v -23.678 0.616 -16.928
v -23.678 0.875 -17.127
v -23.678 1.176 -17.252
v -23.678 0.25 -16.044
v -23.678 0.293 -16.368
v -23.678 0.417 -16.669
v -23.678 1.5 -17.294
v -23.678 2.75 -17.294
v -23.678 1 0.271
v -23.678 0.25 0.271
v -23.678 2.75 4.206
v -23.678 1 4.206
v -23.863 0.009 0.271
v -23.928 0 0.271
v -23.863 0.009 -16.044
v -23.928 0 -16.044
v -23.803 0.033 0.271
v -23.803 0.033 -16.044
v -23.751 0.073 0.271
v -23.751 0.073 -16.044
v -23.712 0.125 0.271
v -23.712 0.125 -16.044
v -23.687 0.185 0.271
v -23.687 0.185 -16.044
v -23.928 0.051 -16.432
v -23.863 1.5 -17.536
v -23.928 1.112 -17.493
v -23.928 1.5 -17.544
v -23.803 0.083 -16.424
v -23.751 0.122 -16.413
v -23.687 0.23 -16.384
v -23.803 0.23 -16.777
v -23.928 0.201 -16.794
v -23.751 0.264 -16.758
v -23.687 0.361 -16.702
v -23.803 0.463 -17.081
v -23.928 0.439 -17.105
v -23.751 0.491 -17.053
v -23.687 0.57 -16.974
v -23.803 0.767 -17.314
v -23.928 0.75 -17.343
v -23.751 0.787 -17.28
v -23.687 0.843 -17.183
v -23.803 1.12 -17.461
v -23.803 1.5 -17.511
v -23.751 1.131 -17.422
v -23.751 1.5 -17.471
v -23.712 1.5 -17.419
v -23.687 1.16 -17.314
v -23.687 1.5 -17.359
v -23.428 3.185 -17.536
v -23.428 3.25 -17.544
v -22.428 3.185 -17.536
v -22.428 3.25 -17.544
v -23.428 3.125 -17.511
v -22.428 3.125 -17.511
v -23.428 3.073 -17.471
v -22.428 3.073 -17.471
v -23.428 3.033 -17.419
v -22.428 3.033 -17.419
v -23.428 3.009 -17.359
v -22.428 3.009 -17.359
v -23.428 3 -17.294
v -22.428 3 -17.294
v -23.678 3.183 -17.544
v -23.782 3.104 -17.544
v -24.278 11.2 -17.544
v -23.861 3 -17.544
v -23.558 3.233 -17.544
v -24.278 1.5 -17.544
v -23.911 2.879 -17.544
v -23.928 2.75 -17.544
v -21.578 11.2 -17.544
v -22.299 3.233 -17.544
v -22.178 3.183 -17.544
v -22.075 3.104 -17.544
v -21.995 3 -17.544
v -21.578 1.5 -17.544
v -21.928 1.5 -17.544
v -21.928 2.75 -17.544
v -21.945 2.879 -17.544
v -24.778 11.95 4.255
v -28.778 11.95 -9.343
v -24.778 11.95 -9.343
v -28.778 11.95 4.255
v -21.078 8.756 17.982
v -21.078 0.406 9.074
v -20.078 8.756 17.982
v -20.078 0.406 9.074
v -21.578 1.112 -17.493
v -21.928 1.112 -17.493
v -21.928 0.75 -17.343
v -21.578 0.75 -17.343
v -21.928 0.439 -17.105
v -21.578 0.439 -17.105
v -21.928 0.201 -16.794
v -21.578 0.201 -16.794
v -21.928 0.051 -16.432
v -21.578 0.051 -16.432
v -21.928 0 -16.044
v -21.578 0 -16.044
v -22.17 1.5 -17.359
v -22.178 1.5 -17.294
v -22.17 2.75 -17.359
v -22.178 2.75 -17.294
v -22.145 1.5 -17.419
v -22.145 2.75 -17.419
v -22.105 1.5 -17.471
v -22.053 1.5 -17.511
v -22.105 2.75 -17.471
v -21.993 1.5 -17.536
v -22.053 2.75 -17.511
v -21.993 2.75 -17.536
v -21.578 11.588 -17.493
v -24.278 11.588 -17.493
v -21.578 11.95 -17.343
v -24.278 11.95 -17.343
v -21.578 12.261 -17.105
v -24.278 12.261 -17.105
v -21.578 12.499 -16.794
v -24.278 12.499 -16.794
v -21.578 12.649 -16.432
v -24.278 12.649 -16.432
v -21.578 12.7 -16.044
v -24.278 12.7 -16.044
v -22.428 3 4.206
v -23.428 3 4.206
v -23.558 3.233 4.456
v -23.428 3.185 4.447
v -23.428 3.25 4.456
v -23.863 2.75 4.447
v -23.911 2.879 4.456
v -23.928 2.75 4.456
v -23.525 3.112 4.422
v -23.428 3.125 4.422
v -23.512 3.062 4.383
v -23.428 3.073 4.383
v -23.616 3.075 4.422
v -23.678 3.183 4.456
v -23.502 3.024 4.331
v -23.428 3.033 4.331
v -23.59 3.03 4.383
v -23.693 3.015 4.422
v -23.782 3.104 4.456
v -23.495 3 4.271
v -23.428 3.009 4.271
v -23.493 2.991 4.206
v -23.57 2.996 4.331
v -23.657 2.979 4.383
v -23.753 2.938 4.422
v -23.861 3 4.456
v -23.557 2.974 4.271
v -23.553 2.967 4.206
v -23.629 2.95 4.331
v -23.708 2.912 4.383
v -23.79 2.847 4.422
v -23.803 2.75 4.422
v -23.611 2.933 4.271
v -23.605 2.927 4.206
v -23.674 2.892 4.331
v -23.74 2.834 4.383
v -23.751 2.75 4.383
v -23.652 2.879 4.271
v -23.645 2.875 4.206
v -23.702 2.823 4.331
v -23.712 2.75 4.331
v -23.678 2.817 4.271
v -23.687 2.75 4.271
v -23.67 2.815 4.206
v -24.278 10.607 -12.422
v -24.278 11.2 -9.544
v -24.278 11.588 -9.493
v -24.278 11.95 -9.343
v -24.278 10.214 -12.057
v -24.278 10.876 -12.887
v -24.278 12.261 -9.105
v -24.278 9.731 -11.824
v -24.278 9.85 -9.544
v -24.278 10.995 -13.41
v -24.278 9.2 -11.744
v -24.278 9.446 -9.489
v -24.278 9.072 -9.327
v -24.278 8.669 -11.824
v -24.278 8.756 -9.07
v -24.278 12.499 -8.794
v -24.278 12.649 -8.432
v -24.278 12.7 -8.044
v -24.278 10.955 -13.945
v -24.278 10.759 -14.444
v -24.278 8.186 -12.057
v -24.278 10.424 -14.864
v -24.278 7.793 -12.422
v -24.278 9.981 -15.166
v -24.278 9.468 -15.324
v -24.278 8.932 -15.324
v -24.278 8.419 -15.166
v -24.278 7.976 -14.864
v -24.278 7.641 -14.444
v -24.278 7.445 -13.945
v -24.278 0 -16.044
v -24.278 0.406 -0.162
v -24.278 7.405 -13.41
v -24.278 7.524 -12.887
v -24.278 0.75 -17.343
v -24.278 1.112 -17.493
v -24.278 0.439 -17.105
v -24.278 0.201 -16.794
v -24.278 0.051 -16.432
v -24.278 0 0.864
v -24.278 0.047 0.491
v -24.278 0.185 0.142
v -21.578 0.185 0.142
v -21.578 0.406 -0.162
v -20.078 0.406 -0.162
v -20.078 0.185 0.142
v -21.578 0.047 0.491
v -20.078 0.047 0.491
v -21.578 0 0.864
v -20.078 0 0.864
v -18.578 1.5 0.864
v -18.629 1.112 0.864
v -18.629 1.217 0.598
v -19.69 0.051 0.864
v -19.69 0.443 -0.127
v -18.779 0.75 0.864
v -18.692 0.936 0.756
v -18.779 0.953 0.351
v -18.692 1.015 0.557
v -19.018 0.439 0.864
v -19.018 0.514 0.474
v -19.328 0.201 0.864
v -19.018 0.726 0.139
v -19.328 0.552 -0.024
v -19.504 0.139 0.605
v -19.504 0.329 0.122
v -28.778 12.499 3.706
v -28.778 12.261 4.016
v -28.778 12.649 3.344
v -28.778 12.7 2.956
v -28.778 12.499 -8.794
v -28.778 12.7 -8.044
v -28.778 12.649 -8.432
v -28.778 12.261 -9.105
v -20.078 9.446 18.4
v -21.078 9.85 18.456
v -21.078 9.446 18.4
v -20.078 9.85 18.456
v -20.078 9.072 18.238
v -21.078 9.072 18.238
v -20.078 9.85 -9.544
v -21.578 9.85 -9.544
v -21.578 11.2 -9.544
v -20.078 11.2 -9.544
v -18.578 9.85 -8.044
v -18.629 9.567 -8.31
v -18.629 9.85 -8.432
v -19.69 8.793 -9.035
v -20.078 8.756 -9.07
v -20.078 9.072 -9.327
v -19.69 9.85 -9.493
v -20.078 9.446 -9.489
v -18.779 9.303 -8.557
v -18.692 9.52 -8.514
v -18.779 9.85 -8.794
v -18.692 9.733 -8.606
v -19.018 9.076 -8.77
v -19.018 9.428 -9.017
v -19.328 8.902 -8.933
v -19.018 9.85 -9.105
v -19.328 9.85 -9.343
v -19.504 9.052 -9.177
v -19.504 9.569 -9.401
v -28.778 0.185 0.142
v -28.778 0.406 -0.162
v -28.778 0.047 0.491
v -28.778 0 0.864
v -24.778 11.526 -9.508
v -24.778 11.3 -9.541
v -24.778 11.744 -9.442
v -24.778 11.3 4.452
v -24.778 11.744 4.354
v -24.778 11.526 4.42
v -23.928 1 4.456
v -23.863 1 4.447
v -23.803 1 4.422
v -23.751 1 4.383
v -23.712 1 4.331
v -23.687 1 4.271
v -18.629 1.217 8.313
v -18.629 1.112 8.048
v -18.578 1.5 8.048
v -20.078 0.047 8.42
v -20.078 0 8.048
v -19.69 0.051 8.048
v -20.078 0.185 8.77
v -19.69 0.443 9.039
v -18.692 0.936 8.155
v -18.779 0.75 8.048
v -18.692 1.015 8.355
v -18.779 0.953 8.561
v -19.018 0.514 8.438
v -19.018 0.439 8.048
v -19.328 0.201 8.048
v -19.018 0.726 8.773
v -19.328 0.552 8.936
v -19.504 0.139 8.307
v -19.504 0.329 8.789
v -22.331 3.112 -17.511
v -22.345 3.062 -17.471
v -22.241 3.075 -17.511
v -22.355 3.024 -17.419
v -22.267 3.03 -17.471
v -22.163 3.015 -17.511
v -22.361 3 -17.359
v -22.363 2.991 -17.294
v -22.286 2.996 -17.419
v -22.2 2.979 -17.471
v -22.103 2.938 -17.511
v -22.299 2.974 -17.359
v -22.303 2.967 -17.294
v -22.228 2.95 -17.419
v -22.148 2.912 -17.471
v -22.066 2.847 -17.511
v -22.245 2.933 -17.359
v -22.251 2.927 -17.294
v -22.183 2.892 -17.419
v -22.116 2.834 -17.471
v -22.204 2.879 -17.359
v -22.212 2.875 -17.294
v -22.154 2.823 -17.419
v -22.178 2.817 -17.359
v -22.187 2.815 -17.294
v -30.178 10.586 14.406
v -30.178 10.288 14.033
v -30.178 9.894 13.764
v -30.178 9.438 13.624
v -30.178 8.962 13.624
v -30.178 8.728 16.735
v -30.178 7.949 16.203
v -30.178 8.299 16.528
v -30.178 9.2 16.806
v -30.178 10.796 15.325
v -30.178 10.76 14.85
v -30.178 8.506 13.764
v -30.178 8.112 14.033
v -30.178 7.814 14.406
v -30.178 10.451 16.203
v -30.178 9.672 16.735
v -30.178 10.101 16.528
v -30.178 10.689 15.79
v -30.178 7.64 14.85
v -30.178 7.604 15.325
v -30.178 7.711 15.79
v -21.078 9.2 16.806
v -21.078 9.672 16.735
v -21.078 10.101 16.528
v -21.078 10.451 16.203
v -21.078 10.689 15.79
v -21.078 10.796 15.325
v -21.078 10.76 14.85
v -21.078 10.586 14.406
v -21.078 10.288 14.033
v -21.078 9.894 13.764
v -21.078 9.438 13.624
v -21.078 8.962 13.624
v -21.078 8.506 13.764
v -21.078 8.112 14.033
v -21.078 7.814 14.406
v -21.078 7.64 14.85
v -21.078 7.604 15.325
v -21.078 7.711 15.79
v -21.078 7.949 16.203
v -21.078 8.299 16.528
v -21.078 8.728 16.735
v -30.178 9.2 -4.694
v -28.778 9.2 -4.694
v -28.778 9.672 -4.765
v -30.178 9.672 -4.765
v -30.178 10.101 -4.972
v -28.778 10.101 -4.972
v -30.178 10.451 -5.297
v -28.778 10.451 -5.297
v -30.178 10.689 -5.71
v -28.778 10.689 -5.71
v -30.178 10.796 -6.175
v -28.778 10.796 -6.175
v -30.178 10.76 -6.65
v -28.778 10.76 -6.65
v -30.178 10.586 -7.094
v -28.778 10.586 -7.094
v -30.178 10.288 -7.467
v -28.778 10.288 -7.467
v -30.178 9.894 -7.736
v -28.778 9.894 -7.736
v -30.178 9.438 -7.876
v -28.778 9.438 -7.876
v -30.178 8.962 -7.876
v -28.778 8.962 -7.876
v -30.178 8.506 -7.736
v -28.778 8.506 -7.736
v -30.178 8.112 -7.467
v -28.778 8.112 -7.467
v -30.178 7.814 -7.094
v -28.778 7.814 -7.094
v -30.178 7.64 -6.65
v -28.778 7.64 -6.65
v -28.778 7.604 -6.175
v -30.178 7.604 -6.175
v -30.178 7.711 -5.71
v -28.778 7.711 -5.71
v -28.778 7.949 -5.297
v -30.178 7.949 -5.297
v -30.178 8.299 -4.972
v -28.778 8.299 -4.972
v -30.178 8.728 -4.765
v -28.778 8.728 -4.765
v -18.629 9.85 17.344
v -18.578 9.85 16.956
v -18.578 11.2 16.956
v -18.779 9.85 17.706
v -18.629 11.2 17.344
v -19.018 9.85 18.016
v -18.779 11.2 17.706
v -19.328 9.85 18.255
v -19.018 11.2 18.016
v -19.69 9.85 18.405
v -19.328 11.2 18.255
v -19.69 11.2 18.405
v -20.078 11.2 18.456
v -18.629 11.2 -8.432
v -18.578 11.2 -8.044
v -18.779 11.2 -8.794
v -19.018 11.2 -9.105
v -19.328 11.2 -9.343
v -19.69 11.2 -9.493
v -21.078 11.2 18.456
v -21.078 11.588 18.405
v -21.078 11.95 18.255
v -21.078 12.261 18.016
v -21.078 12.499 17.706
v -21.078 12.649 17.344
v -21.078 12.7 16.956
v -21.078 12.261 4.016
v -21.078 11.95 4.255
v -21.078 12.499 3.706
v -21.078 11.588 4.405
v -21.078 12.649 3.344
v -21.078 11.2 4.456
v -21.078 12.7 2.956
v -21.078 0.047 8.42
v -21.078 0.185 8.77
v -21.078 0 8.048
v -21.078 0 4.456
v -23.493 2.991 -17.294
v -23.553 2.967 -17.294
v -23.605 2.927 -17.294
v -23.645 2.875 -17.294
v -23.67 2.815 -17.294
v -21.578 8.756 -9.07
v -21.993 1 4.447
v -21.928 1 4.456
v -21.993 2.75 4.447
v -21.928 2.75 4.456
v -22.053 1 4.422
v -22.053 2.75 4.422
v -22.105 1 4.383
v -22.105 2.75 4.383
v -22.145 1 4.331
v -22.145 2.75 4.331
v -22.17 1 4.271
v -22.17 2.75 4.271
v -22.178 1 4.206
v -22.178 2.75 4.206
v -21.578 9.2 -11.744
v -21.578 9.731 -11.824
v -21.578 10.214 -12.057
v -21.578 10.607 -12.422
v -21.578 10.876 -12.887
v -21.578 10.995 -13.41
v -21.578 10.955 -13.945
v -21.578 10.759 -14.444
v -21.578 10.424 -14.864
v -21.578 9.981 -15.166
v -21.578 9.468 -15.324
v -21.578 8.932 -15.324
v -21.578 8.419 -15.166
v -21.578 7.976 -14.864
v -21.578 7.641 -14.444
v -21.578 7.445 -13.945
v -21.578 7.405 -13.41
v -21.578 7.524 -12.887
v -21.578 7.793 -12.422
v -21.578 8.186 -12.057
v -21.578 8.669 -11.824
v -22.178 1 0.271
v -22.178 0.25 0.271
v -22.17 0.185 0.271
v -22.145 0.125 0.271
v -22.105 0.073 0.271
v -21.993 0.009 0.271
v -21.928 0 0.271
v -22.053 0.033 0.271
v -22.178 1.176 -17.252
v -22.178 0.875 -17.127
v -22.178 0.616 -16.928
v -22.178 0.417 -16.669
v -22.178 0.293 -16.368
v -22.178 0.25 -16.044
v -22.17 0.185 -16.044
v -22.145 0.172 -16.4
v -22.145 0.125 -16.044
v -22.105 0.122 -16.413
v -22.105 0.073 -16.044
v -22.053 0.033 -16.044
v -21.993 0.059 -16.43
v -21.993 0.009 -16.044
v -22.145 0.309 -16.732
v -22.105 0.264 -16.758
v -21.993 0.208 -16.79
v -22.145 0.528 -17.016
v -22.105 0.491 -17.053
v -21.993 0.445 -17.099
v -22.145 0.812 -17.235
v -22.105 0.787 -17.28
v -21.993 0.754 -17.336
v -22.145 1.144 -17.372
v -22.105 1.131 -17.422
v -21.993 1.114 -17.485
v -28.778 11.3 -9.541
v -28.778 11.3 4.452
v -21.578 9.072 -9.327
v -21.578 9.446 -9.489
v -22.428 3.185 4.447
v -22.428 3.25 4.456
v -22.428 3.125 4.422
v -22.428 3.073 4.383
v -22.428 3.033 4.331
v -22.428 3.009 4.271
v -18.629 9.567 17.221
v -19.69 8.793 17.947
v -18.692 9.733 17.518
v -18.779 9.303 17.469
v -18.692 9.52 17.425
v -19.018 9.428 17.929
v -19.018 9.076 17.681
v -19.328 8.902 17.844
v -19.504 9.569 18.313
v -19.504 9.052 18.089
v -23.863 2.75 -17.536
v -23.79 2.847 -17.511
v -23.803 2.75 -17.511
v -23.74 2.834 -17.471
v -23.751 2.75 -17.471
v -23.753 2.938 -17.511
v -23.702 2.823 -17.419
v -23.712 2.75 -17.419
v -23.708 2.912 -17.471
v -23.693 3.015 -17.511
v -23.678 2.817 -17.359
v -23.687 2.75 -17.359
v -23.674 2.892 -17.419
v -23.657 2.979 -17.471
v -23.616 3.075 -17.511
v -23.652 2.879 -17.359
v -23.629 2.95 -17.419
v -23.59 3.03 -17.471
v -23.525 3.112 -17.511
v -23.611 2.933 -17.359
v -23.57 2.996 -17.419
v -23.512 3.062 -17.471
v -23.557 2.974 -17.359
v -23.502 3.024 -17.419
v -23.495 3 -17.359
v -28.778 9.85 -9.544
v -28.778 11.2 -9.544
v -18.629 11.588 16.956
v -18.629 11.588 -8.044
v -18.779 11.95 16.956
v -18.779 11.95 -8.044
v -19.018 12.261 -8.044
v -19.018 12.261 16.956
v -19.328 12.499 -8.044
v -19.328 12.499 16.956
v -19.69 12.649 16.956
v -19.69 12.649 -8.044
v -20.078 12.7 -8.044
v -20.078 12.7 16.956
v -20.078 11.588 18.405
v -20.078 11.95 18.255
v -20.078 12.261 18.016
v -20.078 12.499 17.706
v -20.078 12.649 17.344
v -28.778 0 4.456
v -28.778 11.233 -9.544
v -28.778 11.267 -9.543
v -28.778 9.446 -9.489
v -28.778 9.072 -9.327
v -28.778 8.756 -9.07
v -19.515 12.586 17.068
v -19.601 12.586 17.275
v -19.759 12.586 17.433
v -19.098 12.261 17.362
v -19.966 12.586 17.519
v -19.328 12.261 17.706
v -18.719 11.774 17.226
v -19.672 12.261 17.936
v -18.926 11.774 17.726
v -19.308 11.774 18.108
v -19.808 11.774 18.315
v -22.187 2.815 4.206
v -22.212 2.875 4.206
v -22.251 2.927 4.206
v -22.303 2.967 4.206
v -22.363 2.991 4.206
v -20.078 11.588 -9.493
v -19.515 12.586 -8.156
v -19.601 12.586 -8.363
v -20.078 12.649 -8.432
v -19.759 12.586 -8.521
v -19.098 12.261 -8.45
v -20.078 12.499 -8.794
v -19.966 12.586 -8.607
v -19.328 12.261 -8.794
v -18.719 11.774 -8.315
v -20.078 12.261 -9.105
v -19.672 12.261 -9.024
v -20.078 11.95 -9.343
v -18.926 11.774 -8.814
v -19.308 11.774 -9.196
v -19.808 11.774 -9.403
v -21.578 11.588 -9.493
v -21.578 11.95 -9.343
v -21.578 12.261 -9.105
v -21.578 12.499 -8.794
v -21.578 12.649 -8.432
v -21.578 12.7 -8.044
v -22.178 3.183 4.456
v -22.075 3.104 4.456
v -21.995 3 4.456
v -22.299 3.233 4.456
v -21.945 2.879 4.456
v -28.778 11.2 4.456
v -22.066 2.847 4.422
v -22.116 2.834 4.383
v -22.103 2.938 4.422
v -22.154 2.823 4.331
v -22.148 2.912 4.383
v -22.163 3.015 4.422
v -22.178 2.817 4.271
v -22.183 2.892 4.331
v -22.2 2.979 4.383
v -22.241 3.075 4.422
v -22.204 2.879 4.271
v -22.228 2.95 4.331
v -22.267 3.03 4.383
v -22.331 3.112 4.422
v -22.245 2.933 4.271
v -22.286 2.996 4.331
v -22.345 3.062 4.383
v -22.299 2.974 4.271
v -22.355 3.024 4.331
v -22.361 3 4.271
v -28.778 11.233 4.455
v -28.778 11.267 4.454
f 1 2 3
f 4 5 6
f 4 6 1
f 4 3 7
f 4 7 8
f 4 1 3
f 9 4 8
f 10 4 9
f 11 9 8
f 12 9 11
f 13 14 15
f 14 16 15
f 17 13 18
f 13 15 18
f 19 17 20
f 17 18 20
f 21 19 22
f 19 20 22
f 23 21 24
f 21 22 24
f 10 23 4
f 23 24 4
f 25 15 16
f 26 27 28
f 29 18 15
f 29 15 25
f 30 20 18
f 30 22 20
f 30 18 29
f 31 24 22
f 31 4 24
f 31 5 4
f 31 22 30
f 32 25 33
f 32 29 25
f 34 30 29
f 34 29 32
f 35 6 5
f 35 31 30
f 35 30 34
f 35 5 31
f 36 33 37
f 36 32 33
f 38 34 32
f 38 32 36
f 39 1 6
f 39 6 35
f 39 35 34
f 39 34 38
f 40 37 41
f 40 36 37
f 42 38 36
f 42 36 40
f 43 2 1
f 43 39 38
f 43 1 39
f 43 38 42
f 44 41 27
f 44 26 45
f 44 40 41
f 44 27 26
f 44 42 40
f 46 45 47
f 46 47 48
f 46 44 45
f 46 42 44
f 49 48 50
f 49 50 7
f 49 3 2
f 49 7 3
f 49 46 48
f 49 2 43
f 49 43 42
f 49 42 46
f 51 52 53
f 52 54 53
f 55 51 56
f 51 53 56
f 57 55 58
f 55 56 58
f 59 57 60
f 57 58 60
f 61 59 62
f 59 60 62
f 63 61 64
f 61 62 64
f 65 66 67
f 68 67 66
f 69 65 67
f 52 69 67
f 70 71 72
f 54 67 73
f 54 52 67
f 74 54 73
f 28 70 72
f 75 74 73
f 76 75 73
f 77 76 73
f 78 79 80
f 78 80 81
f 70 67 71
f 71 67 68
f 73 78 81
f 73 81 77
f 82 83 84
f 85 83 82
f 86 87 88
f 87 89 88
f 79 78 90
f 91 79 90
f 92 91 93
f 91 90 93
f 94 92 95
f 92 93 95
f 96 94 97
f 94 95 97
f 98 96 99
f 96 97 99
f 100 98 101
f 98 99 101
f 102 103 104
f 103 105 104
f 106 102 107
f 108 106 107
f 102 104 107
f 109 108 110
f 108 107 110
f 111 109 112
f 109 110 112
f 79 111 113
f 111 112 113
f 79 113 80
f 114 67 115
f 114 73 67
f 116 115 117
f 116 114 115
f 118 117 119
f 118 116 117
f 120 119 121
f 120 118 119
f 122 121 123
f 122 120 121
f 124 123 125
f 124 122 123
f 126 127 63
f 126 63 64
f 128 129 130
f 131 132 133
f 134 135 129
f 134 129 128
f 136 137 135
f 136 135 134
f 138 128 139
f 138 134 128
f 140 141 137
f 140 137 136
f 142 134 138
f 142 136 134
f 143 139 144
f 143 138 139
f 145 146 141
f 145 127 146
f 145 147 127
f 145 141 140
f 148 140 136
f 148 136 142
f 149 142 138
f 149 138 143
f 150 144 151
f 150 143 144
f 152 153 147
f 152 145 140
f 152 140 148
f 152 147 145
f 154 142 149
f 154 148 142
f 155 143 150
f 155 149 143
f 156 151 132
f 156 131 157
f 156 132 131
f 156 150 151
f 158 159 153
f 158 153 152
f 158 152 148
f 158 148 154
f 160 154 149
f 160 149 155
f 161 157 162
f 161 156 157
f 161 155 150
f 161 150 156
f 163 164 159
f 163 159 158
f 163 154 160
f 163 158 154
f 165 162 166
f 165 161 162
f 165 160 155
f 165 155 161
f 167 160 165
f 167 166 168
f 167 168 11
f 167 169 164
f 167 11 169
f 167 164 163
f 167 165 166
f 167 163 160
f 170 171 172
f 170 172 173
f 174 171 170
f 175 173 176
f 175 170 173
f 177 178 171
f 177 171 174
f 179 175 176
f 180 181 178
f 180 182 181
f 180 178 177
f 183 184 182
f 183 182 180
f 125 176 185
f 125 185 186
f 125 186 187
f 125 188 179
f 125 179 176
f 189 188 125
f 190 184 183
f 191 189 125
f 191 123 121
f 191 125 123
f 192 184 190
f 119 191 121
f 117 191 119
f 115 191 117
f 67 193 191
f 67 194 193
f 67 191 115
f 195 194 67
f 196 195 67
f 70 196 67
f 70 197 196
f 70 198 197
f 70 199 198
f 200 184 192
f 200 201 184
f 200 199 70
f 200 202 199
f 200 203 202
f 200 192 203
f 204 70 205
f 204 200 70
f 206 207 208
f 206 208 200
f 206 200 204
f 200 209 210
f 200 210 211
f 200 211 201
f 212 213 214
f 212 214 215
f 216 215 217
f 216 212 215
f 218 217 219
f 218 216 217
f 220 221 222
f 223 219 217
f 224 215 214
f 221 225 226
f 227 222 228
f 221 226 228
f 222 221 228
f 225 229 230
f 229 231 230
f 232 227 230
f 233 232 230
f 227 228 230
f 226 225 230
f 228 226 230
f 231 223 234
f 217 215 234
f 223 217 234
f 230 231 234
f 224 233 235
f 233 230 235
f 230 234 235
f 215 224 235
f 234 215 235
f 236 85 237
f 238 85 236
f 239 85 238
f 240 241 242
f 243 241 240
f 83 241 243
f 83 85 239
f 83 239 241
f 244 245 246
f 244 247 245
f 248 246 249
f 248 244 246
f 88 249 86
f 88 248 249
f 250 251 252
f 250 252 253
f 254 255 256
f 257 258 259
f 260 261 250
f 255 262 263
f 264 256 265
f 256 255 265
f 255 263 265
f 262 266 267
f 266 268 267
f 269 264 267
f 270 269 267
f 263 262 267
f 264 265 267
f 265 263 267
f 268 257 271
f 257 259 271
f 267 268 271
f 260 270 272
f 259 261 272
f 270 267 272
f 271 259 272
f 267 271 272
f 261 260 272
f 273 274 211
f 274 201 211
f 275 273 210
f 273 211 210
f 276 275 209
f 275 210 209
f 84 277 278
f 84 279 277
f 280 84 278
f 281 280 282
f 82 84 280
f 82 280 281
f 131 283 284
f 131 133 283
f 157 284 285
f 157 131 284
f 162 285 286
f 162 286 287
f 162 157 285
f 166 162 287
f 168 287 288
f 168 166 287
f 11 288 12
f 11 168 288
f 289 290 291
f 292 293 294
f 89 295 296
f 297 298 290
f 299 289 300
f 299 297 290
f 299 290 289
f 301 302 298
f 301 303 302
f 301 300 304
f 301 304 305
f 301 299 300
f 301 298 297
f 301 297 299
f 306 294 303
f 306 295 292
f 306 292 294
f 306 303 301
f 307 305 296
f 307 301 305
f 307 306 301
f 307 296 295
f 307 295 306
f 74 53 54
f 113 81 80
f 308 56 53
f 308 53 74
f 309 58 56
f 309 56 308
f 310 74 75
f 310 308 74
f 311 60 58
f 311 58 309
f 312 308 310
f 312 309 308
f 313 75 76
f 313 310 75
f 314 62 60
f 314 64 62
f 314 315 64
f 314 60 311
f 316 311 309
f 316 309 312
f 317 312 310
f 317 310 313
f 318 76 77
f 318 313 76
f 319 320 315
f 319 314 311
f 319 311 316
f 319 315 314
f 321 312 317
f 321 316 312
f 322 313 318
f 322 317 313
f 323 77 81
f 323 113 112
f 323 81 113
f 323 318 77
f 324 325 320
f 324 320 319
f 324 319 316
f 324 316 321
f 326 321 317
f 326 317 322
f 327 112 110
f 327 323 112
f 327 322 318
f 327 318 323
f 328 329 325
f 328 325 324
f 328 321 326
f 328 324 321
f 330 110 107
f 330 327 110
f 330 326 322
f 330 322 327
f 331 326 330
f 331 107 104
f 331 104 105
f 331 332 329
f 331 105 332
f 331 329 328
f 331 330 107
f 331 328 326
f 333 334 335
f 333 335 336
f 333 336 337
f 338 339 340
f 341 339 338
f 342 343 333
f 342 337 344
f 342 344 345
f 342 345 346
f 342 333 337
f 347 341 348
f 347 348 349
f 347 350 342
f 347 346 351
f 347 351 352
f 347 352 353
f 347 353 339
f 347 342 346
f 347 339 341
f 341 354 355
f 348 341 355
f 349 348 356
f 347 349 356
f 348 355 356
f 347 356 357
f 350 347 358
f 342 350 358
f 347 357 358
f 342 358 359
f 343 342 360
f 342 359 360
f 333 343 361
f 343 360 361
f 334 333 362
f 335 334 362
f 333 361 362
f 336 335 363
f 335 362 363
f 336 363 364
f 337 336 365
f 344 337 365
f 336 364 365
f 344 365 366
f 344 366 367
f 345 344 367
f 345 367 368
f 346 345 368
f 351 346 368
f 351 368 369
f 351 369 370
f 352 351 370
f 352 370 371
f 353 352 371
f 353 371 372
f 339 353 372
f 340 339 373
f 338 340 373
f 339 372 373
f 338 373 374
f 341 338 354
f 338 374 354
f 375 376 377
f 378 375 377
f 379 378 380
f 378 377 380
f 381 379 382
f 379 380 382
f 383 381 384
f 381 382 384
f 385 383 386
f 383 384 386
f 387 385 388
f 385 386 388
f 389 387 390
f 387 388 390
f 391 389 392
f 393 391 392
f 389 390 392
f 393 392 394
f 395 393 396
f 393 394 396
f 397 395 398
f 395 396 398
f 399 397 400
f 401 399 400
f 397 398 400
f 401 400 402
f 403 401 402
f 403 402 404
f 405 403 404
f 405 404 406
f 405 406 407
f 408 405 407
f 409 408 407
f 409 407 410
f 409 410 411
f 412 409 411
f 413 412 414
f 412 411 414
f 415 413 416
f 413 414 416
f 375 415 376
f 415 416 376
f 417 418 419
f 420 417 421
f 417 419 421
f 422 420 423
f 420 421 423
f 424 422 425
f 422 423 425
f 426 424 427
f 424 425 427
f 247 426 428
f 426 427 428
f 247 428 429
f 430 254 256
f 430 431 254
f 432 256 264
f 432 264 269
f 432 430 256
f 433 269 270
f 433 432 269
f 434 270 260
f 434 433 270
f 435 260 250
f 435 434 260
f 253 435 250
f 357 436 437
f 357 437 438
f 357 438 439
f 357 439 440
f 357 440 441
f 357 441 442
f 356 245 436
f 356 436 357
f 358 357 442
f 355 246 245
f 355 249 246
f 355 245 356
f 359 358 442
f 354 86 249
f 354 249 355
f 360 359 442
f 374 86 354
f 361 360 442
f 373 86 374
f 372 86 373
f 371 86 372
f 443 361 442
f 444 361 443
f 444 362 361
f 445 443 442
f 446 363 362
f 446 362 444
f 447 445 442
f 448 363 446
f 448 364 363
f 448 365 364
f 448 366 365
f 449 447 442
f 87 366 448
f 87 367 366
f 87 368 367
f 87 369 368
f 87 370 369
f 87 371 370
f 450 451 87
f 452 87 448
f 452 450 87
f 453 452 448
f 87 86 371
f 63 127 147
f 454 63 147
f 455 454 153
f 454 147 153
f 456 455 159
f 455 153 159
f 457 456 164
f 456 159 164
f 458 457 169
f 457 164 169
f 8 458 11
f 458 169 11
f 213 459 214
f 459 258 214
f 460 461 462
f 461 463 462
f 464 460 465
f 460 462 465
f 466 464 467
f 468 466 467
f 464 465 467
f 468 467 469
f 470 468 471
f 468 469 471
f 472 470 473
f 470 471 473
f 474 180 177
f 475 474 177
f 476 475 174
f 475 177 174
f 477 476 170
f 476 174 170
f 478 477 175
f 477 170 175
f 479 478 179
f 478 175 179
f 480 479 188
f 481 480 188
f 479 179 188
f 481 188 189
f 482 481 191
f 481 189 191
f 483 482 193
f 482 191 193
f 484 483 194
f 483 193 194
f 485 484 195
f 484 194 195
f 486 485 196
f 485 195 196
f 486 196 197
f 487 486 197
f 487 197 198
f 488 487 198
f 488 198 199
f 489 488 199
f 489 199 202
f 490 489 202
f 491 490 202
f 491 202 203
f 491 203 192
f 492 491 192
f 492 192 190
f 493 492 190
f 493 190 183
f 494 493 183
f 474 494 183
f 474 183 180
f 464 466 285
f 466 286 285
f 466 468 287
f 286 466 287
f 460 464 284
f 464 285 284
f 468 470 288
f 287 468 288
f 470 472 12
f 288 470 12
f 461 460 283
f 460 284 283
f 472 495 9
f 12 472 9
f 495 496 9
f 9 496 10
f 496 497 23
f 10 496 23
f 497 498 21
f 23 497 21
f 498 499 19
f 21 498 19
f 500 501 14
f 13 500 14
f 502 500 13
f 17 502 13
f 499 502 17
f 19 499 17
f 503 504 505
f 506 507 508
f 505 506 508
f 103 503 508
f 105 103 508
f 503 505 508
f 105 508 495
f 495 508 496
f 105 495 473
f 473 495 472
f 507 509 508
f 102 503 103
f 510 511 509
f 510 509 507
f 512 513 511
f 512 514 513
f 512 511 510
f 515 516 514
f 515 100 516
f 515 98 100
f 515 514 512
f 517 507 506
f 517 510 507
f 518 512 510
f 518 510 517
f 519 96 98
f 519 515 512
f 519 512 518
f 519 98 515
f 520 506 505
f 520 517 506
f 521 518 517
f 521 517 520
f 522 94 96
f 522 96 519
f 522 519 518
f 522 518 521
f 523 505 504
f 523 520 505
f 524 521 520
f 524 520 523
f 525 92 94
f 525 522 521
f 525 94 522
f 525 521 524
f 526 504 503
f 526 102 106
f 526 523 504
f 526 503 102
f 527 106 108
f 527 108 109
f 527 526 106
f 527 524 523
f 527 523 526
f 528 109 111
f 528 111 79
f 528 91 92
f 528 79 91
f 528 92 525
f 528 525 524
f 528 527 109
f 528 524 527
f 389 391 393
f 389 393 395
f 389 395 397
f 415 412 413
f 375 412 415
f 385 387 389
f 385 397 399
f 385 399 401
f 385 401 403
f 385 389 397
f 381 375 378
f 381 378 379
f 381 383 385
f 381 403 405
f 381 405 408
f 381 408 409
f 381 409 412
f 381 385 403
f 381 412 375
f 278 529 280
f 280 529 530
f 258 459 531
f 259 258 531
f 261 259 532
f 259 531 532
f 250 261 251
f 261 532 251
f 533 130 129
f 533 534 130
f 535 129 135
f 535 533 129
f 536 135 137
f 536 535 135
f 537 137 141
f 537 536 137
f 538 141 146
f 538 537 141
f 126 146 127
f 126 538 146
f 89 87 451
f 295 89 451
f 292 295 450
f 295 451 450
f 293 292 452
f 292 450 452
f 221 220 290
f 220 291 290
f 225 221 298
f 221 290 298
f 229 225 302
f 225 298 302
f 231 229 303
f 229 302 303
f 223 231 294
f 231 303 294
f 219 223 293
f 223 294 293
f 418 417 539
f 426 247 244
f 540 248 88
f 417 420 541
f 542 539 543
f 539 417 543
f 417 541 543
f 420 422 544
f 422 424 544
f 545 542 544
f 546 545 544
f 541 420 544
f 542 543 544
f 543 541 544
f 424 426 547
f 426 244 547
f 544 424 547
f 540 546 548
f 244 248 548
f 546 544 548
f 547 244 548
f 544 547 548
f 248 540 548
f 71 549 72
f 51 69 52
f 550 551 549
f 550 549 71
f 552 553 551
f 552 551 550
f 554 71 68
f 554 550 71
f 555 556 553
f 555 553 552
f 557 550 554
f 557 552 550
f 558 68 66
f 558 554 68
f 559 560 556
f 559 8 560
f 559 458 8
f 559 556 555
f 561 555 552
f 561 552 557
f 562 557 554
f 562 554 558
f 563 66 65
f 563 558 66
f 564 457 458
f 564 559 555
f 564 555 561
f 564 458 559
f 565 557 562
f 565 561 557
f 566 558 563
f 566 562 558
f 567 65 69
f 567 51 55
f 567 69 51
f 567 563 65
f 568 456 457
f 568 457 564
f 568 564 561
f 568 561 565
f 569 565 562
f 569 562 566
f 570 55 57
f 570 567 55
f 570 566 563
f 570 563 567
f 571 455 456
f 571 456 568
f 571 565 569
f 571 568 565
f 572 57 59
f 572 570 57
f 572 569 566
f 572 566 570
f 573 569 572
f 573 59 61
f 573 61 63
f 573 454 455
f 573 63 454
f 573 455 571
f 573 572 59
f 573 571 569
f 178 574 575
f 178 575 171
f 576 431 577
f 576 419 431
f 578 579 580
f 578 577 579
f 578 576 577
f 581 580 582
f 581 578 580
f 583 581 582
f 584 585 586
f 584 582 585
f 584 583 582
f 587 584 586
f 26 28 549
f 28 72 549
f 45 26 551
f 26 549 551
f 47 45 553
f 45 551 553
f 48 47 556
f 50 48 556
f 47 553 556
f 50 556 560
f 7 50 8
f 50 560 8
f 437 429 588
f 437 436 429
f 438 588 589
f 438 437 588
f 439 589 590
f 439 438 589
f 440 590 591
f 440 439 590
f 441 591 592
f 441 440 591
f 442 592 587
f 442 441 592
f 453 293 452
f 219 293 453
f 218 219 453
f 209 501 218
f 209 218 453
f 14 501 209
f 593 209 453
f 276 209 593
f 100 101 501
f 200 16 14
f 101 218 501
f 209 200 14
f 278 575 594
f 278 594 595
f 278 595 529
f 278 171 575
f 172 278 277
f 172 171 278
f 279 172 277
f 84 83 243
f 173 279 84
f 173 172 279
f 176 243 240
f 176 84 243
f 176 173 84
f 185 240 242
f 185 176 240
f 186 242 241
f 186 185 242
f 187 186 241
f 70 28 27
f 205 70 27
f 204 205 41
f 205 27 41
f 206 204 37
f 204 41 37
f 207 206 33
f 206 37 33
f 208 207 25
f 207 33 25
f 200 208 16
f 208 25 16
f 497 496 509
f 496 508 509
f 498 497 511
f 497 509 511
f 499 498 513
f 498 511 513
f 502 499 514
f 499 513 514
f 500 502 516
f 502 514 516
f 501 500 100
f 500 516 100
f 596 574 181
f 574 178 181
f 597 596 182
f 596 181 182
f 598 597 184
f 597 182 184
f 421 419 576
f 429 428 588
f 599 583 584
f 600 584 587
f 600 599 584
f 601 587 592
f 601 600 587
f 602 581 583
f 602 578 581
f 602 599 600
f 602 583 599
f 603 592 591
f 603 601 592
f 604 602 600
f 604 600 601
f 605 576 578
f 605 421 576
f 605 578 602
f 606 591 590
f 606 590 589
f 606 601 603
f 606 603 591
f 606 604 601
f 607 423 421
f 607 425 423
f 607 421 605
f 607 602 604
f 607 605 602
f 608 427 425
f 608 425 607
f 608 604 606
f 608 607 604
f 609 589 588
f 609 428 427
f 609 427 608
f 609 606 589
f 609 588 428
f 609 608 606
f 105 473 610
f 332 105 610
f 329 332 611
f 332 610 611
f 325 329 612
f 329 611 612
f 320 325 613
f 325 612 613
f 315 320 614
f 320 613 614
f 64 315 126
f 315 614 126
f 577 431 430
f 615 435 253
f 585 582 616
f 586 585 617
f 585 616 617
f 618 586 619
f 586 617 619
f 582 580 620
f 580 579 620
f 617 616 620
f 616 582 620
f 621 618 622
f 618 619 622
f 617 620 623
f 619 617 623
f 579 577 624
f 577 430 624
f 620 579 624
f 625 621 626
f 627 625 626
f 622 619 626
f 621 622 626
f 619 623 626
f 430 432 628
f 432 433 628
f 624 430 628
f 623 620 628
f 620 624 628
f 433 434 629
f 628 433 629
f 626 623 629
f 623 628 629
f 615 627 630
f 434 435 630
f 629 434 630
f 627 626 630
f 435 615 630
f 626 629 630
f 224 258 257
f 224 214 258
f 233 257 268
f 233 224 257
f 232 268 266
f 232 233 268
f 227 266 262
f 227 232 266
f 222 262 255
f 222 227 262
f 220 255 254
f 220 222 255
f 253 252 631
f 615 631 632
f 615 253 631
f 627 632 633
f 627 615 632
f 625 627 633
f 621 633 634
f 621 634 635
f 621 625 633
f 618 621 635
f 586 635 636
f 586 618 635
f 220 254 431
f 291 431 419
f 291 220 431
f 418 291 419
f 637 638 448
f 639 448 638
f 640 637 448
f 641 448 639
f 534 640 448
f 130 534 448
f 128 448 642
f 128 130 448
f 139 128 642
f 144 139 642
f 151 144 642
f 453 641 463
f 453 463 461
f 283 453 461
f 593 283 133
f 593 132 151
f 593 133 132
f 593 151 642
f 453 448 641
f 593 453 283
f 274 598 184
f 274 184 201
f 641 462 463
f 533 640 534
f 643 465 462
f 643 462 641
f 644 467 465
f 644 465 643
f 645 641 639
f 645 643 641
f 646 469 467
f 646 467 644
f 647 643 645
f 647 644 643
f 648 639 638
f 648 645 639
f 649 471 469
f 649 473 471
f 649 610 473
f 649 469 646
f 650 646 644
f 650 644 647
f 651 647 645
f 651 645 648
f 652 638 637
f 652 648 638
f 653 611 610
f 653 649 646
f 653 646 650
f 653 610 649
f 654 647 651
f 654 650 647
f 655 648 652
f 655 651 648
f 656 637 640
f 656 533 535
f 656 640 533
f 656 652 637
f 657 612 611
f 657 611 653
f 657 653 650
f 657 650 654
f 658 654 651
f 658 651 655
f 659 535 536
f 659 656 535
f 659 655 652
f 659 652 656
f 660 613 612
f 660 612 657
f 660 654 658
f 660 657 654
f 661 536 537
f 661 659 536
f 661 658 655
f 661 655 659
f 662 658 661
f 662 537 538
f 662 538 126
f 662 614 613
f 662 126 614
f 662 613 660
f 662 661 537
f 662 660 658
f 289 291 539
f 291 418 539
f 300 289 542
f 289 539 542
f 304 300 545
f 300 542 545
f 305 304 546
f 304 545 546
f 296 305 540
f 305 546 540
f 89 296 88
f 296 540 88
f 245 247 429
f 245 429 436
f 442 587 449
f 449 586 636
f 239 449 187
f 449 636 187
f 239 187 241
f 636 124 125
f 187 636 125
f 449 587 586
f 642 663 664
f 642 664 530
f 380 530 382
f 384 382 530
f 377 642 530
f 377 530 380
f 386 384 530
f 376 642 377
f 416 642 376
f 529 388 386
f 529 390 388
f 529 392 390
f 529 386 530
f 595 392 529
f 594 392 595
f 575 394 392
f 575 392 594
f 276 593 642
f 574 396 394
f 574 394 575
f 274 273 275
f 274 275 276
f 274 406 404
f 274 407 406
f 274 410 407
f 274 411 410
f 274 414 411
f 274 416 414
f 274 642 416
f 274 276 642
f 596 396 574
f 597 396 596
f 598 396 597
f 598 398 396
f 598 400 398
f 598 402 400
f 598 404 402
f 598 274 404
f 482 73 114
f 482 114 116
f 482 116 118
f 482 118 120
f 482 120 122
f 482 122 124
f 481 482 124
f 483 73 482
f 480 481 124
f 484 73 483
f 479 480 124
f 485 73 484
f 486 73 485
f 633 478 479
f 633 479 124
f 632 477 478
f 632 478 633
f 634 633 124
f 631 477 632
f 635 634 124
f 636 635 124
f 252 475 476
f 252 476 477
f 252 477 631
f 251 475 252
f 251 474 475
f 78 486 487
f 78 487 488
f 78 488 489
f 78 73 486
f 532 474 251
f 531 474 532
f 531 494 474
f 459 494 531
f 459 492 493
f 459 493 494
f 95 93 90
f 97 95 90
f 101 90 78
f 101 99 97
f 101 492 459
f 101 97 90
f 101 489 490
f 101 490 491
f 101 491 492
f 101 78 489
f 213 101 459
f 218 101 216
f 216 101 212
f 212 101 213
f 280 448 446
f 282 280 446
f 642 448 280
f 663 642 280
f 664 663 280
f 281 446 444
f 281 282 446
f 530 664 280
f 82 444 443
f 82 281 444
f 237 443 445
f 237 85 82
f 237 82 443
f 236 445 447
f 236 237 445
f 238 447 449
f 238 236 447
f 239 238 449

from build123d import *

# Parameters (mm, degrees)
BOSS_EXTRUDE1_DEPTH = 12.7
CUT_EXTRUDE2_DEPTH  = 4.5
CUT_EXTRUDE3_DEPTH  = 11.2
BOSS_EXTRUDE2_START = -7.7
SKETCH2_5_R         = 1.6
BOSS_EXTRUDE2_DEPTH = 9.1
SKETCH2_6_R         = 1.8
CUT_EXTRUDE4_DEPTH  = 11.2
SKETCH2_7_R         = 1.6
BOSS_EXTRUDE3_DEPTH = 1.4
SKETCH2_8_W         = 36
SKETCH2_8_H         = 0.65
CUT_EXTRUDE5_DEPTH  = 4
CUT_EXTRUDE6_DEPTH  = 3
SKETCH4_W           = 1.5
SKETCH4_H           = 22
CUT_EXTRUDE7_DEPTH  = 3
SKETCH6_W           = 2.1
SKETCH6_H           = 4.185
BOSS_EXTRUDE4_DEPTH = 1
CUT_EXTRUDE9_START  = -10.2
CUT_EXTRUDE9_DEPTH  = 4.5
FILLET3_R           = 1.5
FILLET2_R           = 0.25


with BuildPart() as part:
    # Sketch1 → Boss-Extrude1 (new body)
    with BuildSketch(Plane(origin=(0, 0, 0), x_dir=(1, 0, 0), z_dir=(0, 1, 0))):
        Polygon((-28.77817965, 9.54419618), (-24.27817965, 9.54419618), (-24.27817965, 17.54419618), (-21.57817965, 17.54419618), (-21.57817965, 9.54419618), (-18.57817965, 9.54419618), (-18.57817965, -18.45580382), (-21.07817965, -18.45580382), (-21.07817965, -4.45580382), (-28.77817965, -4.45580382), align=None)
    extrude(amount=BOSS_EXTRUDE1_DEPTH)

    # Sketch2 → Cut-Extrude2 (cut)
    with BuildSketch(Plane.ZY.offset(28.77817965)):
        Polygon((-9.54419618, 3.548072024), (-9.54419618, 0), (-3.657330191, 0), align=None)
    extrude(amount=-CUT_EXTRUDE2_DEPTH, mode=Mode.SUBTRACT)

    # Sketch2<4> → Cut-Extrude3 (cut, through all)
    with BuildSketch(Plane.ZY.offset(28.77817965)):
        Polygon((12.124702683, 0), (18.45580382, 0), (18.45580382, 9.2), align=None)
    extrude(amount=-CUT_EXTRUDE3_DEPTH, mode=Mode.SUBTRACT)

    # Sketch2<5> → Boss-Extrude2 (add)
    with BuildSketch(Plane.ZY.offset(28.77817965).offset(BOSS_EXTRUDE2_START)):
        with Locations((15.20580382, 9.2)):
            Circle(SKETCH2_5_R)
    extrude(amount=BOSS_EXTRUDE2_DEPTH)

    # Sketch2<6> → Cut-Extrude4 (cut, through all)
    with BuildSketch(Plane.ZY.offset(28.77817965)):
        with Locations((-13.54419618, 9.2)):
            Circle(SKETCH2_6_R)
    extrude(amount=-CUT_EXTRUDE4_DEPTH, mode=Mode.SUBTRACT)

    # Sketch2<7> → Boss-Extrude3 (add)
    with BuildSketch(Plane.ZY.offset(28.77817965)):
        with Locations((-6.29419618, 9.2)):
            Circle(SKETCH2_7_R)
    extrude(amount=BOSS_EXTRUDE3_DEPTH)

    # Sketch2<8> → Cut-Extrude5 (cut)
    with BuildSketch(Plane.ZY.offset(28.77817965)):
        with Locations((0.45580382, 11.625)):
            Rectangle(SKETCH2_8_W, SKETCH2_8_H)
    extrude(amount=-CUT_EXTRUDE5_DEPTH, mode=Mode.SUBTRACT)

    # Sketch3 → Cut-Extrude6 (cut)
    with BuildSketch(Plane(origin=(-18.57817965, 0, 0), x_dir=(0, 0, -1), z_dir=(1, 0, 0))):
        Polygon((9.54419618, 0), (9.54419618, 9.2), (-0.27080382, 0), align=None)
        Polygon((-12.124702683, 0), (-18.45580382, 9.2), (-18.45580382, 0), align=None)
        Polygon((-8.64080382, 0), (-18.45580382, 9.2), (-12.124702683, 0), align=None)
    extrude(amount=-CUT_EXTRUDE6_DEPTH, mode=Mode.SUBTRACT)

    # Sketch4 → Cut-Extrude7 (cut)
    with BuildSketch(Plane.XZ):
        with Locations((-22.92817965, -6.54419618)):
            Rectangle(SKETCH4_W, SKETCH4_H)
    extrude(amount=-CUT_EXTRUDE7_DEPTH, mode=Mode.SUBTRACT)

    # Sketch6 → Boss-Extrude4 (add)
    with BuildSketch(Plane(origin=(0, 0, 0), x_dir=(-1, 0, 0), z_dir=(0, -1, 0))):
        with Locations((22.62817965, -2.36330382)):
            Rectangle(SKETCH6_W, SKETCH6_H)
    extrude(amount=-BOSS_EXTRUDE4_DEPTH)

    # Sketch3<3> → Cut-Extrude9 (cut)
    with BuildSketch(Plane(origin=(-18.57817965, 0, 0), x_dir=(0, 0, -1), z_dir=(1, 0, 0)).offset(CUT_EXTRUDE9_START)):
        Polygon((9.54419618, 0), (9.54419618, 9.2), (-0.27080382, 0), align=None)
    extrude(amount=CUT_EXTRUDE9_DEPTH, mode=Mode.SUBTRACT)

    # Fillet3
    fillet3_edges = [part.edges().sort_by_distance(p)[0] for p in [
        (-18.57817965, 0, 4.45580382),
        (-18.57817965, 10.95, 18.45580382),
        (-18.57817965, 4.6, 13.54830382),
        (-18.57817965, 4.6, -4.63669618),
        (-18.57817965, 10.95, -9.54419618),
        (-18.57817965, 12.7, 4.45580382),
        (-24.92817965, 12.7, 4.45580382),
        (-19.82817965, 0, 8.64080382),
        (-19.82817965, 9.2, 18.45580382),
        (-19.82817965, 12.7, 18.45580382),
        (-26.52817965, 0, 0.27080382),
        (-20.07817965, 0, 0.27080382),
        (-20.07817965, 9.2, -9.54419618),
        (-20.07817965, 12.7, -9.54419618),
        (-26.52817965, 9.2, -9.54419618),
        (-26.52817965, 12.7, -9.54419618),
        (-21.87817965, 0, -17.54419618),
        (-23.97817965, 0, -17.54419618),
        (-22.92817965, 12.7, -17.54419618),
    ]]
    fillet(fillet3_edges, radius=FILLET3_R)

    # Fillet2
    fillet2_edges = [part.edges().sort_by_distance(p)[0] for p in [
        (-22.17817965, 3, -6.54419618),
        (-22.17817965, 2, 4.45580382),
        (-22.92817965, 3, -17.54419618),
        (-22.17817965, 2.25, -17.54419618),
        (-23.67817965, 3, -6.54419618),
        (-23.67817965, 2.25, -17.54419618),
        (-22.92817965, 3, 4.45580382),
        (-23.67817965, 2, 4.45580382),
        (-23.67817965, 0, -7.88669618),
        (-22.17817965, 0, -7.88669618),
        (-22.17817965, 0.439339828, -17.104856352),
        (-23.67817965, 0.439339828, -17.104856352),
    ]]
    fillet(fillet2_edges, radius=FILLET2_R)


solid = part.part
